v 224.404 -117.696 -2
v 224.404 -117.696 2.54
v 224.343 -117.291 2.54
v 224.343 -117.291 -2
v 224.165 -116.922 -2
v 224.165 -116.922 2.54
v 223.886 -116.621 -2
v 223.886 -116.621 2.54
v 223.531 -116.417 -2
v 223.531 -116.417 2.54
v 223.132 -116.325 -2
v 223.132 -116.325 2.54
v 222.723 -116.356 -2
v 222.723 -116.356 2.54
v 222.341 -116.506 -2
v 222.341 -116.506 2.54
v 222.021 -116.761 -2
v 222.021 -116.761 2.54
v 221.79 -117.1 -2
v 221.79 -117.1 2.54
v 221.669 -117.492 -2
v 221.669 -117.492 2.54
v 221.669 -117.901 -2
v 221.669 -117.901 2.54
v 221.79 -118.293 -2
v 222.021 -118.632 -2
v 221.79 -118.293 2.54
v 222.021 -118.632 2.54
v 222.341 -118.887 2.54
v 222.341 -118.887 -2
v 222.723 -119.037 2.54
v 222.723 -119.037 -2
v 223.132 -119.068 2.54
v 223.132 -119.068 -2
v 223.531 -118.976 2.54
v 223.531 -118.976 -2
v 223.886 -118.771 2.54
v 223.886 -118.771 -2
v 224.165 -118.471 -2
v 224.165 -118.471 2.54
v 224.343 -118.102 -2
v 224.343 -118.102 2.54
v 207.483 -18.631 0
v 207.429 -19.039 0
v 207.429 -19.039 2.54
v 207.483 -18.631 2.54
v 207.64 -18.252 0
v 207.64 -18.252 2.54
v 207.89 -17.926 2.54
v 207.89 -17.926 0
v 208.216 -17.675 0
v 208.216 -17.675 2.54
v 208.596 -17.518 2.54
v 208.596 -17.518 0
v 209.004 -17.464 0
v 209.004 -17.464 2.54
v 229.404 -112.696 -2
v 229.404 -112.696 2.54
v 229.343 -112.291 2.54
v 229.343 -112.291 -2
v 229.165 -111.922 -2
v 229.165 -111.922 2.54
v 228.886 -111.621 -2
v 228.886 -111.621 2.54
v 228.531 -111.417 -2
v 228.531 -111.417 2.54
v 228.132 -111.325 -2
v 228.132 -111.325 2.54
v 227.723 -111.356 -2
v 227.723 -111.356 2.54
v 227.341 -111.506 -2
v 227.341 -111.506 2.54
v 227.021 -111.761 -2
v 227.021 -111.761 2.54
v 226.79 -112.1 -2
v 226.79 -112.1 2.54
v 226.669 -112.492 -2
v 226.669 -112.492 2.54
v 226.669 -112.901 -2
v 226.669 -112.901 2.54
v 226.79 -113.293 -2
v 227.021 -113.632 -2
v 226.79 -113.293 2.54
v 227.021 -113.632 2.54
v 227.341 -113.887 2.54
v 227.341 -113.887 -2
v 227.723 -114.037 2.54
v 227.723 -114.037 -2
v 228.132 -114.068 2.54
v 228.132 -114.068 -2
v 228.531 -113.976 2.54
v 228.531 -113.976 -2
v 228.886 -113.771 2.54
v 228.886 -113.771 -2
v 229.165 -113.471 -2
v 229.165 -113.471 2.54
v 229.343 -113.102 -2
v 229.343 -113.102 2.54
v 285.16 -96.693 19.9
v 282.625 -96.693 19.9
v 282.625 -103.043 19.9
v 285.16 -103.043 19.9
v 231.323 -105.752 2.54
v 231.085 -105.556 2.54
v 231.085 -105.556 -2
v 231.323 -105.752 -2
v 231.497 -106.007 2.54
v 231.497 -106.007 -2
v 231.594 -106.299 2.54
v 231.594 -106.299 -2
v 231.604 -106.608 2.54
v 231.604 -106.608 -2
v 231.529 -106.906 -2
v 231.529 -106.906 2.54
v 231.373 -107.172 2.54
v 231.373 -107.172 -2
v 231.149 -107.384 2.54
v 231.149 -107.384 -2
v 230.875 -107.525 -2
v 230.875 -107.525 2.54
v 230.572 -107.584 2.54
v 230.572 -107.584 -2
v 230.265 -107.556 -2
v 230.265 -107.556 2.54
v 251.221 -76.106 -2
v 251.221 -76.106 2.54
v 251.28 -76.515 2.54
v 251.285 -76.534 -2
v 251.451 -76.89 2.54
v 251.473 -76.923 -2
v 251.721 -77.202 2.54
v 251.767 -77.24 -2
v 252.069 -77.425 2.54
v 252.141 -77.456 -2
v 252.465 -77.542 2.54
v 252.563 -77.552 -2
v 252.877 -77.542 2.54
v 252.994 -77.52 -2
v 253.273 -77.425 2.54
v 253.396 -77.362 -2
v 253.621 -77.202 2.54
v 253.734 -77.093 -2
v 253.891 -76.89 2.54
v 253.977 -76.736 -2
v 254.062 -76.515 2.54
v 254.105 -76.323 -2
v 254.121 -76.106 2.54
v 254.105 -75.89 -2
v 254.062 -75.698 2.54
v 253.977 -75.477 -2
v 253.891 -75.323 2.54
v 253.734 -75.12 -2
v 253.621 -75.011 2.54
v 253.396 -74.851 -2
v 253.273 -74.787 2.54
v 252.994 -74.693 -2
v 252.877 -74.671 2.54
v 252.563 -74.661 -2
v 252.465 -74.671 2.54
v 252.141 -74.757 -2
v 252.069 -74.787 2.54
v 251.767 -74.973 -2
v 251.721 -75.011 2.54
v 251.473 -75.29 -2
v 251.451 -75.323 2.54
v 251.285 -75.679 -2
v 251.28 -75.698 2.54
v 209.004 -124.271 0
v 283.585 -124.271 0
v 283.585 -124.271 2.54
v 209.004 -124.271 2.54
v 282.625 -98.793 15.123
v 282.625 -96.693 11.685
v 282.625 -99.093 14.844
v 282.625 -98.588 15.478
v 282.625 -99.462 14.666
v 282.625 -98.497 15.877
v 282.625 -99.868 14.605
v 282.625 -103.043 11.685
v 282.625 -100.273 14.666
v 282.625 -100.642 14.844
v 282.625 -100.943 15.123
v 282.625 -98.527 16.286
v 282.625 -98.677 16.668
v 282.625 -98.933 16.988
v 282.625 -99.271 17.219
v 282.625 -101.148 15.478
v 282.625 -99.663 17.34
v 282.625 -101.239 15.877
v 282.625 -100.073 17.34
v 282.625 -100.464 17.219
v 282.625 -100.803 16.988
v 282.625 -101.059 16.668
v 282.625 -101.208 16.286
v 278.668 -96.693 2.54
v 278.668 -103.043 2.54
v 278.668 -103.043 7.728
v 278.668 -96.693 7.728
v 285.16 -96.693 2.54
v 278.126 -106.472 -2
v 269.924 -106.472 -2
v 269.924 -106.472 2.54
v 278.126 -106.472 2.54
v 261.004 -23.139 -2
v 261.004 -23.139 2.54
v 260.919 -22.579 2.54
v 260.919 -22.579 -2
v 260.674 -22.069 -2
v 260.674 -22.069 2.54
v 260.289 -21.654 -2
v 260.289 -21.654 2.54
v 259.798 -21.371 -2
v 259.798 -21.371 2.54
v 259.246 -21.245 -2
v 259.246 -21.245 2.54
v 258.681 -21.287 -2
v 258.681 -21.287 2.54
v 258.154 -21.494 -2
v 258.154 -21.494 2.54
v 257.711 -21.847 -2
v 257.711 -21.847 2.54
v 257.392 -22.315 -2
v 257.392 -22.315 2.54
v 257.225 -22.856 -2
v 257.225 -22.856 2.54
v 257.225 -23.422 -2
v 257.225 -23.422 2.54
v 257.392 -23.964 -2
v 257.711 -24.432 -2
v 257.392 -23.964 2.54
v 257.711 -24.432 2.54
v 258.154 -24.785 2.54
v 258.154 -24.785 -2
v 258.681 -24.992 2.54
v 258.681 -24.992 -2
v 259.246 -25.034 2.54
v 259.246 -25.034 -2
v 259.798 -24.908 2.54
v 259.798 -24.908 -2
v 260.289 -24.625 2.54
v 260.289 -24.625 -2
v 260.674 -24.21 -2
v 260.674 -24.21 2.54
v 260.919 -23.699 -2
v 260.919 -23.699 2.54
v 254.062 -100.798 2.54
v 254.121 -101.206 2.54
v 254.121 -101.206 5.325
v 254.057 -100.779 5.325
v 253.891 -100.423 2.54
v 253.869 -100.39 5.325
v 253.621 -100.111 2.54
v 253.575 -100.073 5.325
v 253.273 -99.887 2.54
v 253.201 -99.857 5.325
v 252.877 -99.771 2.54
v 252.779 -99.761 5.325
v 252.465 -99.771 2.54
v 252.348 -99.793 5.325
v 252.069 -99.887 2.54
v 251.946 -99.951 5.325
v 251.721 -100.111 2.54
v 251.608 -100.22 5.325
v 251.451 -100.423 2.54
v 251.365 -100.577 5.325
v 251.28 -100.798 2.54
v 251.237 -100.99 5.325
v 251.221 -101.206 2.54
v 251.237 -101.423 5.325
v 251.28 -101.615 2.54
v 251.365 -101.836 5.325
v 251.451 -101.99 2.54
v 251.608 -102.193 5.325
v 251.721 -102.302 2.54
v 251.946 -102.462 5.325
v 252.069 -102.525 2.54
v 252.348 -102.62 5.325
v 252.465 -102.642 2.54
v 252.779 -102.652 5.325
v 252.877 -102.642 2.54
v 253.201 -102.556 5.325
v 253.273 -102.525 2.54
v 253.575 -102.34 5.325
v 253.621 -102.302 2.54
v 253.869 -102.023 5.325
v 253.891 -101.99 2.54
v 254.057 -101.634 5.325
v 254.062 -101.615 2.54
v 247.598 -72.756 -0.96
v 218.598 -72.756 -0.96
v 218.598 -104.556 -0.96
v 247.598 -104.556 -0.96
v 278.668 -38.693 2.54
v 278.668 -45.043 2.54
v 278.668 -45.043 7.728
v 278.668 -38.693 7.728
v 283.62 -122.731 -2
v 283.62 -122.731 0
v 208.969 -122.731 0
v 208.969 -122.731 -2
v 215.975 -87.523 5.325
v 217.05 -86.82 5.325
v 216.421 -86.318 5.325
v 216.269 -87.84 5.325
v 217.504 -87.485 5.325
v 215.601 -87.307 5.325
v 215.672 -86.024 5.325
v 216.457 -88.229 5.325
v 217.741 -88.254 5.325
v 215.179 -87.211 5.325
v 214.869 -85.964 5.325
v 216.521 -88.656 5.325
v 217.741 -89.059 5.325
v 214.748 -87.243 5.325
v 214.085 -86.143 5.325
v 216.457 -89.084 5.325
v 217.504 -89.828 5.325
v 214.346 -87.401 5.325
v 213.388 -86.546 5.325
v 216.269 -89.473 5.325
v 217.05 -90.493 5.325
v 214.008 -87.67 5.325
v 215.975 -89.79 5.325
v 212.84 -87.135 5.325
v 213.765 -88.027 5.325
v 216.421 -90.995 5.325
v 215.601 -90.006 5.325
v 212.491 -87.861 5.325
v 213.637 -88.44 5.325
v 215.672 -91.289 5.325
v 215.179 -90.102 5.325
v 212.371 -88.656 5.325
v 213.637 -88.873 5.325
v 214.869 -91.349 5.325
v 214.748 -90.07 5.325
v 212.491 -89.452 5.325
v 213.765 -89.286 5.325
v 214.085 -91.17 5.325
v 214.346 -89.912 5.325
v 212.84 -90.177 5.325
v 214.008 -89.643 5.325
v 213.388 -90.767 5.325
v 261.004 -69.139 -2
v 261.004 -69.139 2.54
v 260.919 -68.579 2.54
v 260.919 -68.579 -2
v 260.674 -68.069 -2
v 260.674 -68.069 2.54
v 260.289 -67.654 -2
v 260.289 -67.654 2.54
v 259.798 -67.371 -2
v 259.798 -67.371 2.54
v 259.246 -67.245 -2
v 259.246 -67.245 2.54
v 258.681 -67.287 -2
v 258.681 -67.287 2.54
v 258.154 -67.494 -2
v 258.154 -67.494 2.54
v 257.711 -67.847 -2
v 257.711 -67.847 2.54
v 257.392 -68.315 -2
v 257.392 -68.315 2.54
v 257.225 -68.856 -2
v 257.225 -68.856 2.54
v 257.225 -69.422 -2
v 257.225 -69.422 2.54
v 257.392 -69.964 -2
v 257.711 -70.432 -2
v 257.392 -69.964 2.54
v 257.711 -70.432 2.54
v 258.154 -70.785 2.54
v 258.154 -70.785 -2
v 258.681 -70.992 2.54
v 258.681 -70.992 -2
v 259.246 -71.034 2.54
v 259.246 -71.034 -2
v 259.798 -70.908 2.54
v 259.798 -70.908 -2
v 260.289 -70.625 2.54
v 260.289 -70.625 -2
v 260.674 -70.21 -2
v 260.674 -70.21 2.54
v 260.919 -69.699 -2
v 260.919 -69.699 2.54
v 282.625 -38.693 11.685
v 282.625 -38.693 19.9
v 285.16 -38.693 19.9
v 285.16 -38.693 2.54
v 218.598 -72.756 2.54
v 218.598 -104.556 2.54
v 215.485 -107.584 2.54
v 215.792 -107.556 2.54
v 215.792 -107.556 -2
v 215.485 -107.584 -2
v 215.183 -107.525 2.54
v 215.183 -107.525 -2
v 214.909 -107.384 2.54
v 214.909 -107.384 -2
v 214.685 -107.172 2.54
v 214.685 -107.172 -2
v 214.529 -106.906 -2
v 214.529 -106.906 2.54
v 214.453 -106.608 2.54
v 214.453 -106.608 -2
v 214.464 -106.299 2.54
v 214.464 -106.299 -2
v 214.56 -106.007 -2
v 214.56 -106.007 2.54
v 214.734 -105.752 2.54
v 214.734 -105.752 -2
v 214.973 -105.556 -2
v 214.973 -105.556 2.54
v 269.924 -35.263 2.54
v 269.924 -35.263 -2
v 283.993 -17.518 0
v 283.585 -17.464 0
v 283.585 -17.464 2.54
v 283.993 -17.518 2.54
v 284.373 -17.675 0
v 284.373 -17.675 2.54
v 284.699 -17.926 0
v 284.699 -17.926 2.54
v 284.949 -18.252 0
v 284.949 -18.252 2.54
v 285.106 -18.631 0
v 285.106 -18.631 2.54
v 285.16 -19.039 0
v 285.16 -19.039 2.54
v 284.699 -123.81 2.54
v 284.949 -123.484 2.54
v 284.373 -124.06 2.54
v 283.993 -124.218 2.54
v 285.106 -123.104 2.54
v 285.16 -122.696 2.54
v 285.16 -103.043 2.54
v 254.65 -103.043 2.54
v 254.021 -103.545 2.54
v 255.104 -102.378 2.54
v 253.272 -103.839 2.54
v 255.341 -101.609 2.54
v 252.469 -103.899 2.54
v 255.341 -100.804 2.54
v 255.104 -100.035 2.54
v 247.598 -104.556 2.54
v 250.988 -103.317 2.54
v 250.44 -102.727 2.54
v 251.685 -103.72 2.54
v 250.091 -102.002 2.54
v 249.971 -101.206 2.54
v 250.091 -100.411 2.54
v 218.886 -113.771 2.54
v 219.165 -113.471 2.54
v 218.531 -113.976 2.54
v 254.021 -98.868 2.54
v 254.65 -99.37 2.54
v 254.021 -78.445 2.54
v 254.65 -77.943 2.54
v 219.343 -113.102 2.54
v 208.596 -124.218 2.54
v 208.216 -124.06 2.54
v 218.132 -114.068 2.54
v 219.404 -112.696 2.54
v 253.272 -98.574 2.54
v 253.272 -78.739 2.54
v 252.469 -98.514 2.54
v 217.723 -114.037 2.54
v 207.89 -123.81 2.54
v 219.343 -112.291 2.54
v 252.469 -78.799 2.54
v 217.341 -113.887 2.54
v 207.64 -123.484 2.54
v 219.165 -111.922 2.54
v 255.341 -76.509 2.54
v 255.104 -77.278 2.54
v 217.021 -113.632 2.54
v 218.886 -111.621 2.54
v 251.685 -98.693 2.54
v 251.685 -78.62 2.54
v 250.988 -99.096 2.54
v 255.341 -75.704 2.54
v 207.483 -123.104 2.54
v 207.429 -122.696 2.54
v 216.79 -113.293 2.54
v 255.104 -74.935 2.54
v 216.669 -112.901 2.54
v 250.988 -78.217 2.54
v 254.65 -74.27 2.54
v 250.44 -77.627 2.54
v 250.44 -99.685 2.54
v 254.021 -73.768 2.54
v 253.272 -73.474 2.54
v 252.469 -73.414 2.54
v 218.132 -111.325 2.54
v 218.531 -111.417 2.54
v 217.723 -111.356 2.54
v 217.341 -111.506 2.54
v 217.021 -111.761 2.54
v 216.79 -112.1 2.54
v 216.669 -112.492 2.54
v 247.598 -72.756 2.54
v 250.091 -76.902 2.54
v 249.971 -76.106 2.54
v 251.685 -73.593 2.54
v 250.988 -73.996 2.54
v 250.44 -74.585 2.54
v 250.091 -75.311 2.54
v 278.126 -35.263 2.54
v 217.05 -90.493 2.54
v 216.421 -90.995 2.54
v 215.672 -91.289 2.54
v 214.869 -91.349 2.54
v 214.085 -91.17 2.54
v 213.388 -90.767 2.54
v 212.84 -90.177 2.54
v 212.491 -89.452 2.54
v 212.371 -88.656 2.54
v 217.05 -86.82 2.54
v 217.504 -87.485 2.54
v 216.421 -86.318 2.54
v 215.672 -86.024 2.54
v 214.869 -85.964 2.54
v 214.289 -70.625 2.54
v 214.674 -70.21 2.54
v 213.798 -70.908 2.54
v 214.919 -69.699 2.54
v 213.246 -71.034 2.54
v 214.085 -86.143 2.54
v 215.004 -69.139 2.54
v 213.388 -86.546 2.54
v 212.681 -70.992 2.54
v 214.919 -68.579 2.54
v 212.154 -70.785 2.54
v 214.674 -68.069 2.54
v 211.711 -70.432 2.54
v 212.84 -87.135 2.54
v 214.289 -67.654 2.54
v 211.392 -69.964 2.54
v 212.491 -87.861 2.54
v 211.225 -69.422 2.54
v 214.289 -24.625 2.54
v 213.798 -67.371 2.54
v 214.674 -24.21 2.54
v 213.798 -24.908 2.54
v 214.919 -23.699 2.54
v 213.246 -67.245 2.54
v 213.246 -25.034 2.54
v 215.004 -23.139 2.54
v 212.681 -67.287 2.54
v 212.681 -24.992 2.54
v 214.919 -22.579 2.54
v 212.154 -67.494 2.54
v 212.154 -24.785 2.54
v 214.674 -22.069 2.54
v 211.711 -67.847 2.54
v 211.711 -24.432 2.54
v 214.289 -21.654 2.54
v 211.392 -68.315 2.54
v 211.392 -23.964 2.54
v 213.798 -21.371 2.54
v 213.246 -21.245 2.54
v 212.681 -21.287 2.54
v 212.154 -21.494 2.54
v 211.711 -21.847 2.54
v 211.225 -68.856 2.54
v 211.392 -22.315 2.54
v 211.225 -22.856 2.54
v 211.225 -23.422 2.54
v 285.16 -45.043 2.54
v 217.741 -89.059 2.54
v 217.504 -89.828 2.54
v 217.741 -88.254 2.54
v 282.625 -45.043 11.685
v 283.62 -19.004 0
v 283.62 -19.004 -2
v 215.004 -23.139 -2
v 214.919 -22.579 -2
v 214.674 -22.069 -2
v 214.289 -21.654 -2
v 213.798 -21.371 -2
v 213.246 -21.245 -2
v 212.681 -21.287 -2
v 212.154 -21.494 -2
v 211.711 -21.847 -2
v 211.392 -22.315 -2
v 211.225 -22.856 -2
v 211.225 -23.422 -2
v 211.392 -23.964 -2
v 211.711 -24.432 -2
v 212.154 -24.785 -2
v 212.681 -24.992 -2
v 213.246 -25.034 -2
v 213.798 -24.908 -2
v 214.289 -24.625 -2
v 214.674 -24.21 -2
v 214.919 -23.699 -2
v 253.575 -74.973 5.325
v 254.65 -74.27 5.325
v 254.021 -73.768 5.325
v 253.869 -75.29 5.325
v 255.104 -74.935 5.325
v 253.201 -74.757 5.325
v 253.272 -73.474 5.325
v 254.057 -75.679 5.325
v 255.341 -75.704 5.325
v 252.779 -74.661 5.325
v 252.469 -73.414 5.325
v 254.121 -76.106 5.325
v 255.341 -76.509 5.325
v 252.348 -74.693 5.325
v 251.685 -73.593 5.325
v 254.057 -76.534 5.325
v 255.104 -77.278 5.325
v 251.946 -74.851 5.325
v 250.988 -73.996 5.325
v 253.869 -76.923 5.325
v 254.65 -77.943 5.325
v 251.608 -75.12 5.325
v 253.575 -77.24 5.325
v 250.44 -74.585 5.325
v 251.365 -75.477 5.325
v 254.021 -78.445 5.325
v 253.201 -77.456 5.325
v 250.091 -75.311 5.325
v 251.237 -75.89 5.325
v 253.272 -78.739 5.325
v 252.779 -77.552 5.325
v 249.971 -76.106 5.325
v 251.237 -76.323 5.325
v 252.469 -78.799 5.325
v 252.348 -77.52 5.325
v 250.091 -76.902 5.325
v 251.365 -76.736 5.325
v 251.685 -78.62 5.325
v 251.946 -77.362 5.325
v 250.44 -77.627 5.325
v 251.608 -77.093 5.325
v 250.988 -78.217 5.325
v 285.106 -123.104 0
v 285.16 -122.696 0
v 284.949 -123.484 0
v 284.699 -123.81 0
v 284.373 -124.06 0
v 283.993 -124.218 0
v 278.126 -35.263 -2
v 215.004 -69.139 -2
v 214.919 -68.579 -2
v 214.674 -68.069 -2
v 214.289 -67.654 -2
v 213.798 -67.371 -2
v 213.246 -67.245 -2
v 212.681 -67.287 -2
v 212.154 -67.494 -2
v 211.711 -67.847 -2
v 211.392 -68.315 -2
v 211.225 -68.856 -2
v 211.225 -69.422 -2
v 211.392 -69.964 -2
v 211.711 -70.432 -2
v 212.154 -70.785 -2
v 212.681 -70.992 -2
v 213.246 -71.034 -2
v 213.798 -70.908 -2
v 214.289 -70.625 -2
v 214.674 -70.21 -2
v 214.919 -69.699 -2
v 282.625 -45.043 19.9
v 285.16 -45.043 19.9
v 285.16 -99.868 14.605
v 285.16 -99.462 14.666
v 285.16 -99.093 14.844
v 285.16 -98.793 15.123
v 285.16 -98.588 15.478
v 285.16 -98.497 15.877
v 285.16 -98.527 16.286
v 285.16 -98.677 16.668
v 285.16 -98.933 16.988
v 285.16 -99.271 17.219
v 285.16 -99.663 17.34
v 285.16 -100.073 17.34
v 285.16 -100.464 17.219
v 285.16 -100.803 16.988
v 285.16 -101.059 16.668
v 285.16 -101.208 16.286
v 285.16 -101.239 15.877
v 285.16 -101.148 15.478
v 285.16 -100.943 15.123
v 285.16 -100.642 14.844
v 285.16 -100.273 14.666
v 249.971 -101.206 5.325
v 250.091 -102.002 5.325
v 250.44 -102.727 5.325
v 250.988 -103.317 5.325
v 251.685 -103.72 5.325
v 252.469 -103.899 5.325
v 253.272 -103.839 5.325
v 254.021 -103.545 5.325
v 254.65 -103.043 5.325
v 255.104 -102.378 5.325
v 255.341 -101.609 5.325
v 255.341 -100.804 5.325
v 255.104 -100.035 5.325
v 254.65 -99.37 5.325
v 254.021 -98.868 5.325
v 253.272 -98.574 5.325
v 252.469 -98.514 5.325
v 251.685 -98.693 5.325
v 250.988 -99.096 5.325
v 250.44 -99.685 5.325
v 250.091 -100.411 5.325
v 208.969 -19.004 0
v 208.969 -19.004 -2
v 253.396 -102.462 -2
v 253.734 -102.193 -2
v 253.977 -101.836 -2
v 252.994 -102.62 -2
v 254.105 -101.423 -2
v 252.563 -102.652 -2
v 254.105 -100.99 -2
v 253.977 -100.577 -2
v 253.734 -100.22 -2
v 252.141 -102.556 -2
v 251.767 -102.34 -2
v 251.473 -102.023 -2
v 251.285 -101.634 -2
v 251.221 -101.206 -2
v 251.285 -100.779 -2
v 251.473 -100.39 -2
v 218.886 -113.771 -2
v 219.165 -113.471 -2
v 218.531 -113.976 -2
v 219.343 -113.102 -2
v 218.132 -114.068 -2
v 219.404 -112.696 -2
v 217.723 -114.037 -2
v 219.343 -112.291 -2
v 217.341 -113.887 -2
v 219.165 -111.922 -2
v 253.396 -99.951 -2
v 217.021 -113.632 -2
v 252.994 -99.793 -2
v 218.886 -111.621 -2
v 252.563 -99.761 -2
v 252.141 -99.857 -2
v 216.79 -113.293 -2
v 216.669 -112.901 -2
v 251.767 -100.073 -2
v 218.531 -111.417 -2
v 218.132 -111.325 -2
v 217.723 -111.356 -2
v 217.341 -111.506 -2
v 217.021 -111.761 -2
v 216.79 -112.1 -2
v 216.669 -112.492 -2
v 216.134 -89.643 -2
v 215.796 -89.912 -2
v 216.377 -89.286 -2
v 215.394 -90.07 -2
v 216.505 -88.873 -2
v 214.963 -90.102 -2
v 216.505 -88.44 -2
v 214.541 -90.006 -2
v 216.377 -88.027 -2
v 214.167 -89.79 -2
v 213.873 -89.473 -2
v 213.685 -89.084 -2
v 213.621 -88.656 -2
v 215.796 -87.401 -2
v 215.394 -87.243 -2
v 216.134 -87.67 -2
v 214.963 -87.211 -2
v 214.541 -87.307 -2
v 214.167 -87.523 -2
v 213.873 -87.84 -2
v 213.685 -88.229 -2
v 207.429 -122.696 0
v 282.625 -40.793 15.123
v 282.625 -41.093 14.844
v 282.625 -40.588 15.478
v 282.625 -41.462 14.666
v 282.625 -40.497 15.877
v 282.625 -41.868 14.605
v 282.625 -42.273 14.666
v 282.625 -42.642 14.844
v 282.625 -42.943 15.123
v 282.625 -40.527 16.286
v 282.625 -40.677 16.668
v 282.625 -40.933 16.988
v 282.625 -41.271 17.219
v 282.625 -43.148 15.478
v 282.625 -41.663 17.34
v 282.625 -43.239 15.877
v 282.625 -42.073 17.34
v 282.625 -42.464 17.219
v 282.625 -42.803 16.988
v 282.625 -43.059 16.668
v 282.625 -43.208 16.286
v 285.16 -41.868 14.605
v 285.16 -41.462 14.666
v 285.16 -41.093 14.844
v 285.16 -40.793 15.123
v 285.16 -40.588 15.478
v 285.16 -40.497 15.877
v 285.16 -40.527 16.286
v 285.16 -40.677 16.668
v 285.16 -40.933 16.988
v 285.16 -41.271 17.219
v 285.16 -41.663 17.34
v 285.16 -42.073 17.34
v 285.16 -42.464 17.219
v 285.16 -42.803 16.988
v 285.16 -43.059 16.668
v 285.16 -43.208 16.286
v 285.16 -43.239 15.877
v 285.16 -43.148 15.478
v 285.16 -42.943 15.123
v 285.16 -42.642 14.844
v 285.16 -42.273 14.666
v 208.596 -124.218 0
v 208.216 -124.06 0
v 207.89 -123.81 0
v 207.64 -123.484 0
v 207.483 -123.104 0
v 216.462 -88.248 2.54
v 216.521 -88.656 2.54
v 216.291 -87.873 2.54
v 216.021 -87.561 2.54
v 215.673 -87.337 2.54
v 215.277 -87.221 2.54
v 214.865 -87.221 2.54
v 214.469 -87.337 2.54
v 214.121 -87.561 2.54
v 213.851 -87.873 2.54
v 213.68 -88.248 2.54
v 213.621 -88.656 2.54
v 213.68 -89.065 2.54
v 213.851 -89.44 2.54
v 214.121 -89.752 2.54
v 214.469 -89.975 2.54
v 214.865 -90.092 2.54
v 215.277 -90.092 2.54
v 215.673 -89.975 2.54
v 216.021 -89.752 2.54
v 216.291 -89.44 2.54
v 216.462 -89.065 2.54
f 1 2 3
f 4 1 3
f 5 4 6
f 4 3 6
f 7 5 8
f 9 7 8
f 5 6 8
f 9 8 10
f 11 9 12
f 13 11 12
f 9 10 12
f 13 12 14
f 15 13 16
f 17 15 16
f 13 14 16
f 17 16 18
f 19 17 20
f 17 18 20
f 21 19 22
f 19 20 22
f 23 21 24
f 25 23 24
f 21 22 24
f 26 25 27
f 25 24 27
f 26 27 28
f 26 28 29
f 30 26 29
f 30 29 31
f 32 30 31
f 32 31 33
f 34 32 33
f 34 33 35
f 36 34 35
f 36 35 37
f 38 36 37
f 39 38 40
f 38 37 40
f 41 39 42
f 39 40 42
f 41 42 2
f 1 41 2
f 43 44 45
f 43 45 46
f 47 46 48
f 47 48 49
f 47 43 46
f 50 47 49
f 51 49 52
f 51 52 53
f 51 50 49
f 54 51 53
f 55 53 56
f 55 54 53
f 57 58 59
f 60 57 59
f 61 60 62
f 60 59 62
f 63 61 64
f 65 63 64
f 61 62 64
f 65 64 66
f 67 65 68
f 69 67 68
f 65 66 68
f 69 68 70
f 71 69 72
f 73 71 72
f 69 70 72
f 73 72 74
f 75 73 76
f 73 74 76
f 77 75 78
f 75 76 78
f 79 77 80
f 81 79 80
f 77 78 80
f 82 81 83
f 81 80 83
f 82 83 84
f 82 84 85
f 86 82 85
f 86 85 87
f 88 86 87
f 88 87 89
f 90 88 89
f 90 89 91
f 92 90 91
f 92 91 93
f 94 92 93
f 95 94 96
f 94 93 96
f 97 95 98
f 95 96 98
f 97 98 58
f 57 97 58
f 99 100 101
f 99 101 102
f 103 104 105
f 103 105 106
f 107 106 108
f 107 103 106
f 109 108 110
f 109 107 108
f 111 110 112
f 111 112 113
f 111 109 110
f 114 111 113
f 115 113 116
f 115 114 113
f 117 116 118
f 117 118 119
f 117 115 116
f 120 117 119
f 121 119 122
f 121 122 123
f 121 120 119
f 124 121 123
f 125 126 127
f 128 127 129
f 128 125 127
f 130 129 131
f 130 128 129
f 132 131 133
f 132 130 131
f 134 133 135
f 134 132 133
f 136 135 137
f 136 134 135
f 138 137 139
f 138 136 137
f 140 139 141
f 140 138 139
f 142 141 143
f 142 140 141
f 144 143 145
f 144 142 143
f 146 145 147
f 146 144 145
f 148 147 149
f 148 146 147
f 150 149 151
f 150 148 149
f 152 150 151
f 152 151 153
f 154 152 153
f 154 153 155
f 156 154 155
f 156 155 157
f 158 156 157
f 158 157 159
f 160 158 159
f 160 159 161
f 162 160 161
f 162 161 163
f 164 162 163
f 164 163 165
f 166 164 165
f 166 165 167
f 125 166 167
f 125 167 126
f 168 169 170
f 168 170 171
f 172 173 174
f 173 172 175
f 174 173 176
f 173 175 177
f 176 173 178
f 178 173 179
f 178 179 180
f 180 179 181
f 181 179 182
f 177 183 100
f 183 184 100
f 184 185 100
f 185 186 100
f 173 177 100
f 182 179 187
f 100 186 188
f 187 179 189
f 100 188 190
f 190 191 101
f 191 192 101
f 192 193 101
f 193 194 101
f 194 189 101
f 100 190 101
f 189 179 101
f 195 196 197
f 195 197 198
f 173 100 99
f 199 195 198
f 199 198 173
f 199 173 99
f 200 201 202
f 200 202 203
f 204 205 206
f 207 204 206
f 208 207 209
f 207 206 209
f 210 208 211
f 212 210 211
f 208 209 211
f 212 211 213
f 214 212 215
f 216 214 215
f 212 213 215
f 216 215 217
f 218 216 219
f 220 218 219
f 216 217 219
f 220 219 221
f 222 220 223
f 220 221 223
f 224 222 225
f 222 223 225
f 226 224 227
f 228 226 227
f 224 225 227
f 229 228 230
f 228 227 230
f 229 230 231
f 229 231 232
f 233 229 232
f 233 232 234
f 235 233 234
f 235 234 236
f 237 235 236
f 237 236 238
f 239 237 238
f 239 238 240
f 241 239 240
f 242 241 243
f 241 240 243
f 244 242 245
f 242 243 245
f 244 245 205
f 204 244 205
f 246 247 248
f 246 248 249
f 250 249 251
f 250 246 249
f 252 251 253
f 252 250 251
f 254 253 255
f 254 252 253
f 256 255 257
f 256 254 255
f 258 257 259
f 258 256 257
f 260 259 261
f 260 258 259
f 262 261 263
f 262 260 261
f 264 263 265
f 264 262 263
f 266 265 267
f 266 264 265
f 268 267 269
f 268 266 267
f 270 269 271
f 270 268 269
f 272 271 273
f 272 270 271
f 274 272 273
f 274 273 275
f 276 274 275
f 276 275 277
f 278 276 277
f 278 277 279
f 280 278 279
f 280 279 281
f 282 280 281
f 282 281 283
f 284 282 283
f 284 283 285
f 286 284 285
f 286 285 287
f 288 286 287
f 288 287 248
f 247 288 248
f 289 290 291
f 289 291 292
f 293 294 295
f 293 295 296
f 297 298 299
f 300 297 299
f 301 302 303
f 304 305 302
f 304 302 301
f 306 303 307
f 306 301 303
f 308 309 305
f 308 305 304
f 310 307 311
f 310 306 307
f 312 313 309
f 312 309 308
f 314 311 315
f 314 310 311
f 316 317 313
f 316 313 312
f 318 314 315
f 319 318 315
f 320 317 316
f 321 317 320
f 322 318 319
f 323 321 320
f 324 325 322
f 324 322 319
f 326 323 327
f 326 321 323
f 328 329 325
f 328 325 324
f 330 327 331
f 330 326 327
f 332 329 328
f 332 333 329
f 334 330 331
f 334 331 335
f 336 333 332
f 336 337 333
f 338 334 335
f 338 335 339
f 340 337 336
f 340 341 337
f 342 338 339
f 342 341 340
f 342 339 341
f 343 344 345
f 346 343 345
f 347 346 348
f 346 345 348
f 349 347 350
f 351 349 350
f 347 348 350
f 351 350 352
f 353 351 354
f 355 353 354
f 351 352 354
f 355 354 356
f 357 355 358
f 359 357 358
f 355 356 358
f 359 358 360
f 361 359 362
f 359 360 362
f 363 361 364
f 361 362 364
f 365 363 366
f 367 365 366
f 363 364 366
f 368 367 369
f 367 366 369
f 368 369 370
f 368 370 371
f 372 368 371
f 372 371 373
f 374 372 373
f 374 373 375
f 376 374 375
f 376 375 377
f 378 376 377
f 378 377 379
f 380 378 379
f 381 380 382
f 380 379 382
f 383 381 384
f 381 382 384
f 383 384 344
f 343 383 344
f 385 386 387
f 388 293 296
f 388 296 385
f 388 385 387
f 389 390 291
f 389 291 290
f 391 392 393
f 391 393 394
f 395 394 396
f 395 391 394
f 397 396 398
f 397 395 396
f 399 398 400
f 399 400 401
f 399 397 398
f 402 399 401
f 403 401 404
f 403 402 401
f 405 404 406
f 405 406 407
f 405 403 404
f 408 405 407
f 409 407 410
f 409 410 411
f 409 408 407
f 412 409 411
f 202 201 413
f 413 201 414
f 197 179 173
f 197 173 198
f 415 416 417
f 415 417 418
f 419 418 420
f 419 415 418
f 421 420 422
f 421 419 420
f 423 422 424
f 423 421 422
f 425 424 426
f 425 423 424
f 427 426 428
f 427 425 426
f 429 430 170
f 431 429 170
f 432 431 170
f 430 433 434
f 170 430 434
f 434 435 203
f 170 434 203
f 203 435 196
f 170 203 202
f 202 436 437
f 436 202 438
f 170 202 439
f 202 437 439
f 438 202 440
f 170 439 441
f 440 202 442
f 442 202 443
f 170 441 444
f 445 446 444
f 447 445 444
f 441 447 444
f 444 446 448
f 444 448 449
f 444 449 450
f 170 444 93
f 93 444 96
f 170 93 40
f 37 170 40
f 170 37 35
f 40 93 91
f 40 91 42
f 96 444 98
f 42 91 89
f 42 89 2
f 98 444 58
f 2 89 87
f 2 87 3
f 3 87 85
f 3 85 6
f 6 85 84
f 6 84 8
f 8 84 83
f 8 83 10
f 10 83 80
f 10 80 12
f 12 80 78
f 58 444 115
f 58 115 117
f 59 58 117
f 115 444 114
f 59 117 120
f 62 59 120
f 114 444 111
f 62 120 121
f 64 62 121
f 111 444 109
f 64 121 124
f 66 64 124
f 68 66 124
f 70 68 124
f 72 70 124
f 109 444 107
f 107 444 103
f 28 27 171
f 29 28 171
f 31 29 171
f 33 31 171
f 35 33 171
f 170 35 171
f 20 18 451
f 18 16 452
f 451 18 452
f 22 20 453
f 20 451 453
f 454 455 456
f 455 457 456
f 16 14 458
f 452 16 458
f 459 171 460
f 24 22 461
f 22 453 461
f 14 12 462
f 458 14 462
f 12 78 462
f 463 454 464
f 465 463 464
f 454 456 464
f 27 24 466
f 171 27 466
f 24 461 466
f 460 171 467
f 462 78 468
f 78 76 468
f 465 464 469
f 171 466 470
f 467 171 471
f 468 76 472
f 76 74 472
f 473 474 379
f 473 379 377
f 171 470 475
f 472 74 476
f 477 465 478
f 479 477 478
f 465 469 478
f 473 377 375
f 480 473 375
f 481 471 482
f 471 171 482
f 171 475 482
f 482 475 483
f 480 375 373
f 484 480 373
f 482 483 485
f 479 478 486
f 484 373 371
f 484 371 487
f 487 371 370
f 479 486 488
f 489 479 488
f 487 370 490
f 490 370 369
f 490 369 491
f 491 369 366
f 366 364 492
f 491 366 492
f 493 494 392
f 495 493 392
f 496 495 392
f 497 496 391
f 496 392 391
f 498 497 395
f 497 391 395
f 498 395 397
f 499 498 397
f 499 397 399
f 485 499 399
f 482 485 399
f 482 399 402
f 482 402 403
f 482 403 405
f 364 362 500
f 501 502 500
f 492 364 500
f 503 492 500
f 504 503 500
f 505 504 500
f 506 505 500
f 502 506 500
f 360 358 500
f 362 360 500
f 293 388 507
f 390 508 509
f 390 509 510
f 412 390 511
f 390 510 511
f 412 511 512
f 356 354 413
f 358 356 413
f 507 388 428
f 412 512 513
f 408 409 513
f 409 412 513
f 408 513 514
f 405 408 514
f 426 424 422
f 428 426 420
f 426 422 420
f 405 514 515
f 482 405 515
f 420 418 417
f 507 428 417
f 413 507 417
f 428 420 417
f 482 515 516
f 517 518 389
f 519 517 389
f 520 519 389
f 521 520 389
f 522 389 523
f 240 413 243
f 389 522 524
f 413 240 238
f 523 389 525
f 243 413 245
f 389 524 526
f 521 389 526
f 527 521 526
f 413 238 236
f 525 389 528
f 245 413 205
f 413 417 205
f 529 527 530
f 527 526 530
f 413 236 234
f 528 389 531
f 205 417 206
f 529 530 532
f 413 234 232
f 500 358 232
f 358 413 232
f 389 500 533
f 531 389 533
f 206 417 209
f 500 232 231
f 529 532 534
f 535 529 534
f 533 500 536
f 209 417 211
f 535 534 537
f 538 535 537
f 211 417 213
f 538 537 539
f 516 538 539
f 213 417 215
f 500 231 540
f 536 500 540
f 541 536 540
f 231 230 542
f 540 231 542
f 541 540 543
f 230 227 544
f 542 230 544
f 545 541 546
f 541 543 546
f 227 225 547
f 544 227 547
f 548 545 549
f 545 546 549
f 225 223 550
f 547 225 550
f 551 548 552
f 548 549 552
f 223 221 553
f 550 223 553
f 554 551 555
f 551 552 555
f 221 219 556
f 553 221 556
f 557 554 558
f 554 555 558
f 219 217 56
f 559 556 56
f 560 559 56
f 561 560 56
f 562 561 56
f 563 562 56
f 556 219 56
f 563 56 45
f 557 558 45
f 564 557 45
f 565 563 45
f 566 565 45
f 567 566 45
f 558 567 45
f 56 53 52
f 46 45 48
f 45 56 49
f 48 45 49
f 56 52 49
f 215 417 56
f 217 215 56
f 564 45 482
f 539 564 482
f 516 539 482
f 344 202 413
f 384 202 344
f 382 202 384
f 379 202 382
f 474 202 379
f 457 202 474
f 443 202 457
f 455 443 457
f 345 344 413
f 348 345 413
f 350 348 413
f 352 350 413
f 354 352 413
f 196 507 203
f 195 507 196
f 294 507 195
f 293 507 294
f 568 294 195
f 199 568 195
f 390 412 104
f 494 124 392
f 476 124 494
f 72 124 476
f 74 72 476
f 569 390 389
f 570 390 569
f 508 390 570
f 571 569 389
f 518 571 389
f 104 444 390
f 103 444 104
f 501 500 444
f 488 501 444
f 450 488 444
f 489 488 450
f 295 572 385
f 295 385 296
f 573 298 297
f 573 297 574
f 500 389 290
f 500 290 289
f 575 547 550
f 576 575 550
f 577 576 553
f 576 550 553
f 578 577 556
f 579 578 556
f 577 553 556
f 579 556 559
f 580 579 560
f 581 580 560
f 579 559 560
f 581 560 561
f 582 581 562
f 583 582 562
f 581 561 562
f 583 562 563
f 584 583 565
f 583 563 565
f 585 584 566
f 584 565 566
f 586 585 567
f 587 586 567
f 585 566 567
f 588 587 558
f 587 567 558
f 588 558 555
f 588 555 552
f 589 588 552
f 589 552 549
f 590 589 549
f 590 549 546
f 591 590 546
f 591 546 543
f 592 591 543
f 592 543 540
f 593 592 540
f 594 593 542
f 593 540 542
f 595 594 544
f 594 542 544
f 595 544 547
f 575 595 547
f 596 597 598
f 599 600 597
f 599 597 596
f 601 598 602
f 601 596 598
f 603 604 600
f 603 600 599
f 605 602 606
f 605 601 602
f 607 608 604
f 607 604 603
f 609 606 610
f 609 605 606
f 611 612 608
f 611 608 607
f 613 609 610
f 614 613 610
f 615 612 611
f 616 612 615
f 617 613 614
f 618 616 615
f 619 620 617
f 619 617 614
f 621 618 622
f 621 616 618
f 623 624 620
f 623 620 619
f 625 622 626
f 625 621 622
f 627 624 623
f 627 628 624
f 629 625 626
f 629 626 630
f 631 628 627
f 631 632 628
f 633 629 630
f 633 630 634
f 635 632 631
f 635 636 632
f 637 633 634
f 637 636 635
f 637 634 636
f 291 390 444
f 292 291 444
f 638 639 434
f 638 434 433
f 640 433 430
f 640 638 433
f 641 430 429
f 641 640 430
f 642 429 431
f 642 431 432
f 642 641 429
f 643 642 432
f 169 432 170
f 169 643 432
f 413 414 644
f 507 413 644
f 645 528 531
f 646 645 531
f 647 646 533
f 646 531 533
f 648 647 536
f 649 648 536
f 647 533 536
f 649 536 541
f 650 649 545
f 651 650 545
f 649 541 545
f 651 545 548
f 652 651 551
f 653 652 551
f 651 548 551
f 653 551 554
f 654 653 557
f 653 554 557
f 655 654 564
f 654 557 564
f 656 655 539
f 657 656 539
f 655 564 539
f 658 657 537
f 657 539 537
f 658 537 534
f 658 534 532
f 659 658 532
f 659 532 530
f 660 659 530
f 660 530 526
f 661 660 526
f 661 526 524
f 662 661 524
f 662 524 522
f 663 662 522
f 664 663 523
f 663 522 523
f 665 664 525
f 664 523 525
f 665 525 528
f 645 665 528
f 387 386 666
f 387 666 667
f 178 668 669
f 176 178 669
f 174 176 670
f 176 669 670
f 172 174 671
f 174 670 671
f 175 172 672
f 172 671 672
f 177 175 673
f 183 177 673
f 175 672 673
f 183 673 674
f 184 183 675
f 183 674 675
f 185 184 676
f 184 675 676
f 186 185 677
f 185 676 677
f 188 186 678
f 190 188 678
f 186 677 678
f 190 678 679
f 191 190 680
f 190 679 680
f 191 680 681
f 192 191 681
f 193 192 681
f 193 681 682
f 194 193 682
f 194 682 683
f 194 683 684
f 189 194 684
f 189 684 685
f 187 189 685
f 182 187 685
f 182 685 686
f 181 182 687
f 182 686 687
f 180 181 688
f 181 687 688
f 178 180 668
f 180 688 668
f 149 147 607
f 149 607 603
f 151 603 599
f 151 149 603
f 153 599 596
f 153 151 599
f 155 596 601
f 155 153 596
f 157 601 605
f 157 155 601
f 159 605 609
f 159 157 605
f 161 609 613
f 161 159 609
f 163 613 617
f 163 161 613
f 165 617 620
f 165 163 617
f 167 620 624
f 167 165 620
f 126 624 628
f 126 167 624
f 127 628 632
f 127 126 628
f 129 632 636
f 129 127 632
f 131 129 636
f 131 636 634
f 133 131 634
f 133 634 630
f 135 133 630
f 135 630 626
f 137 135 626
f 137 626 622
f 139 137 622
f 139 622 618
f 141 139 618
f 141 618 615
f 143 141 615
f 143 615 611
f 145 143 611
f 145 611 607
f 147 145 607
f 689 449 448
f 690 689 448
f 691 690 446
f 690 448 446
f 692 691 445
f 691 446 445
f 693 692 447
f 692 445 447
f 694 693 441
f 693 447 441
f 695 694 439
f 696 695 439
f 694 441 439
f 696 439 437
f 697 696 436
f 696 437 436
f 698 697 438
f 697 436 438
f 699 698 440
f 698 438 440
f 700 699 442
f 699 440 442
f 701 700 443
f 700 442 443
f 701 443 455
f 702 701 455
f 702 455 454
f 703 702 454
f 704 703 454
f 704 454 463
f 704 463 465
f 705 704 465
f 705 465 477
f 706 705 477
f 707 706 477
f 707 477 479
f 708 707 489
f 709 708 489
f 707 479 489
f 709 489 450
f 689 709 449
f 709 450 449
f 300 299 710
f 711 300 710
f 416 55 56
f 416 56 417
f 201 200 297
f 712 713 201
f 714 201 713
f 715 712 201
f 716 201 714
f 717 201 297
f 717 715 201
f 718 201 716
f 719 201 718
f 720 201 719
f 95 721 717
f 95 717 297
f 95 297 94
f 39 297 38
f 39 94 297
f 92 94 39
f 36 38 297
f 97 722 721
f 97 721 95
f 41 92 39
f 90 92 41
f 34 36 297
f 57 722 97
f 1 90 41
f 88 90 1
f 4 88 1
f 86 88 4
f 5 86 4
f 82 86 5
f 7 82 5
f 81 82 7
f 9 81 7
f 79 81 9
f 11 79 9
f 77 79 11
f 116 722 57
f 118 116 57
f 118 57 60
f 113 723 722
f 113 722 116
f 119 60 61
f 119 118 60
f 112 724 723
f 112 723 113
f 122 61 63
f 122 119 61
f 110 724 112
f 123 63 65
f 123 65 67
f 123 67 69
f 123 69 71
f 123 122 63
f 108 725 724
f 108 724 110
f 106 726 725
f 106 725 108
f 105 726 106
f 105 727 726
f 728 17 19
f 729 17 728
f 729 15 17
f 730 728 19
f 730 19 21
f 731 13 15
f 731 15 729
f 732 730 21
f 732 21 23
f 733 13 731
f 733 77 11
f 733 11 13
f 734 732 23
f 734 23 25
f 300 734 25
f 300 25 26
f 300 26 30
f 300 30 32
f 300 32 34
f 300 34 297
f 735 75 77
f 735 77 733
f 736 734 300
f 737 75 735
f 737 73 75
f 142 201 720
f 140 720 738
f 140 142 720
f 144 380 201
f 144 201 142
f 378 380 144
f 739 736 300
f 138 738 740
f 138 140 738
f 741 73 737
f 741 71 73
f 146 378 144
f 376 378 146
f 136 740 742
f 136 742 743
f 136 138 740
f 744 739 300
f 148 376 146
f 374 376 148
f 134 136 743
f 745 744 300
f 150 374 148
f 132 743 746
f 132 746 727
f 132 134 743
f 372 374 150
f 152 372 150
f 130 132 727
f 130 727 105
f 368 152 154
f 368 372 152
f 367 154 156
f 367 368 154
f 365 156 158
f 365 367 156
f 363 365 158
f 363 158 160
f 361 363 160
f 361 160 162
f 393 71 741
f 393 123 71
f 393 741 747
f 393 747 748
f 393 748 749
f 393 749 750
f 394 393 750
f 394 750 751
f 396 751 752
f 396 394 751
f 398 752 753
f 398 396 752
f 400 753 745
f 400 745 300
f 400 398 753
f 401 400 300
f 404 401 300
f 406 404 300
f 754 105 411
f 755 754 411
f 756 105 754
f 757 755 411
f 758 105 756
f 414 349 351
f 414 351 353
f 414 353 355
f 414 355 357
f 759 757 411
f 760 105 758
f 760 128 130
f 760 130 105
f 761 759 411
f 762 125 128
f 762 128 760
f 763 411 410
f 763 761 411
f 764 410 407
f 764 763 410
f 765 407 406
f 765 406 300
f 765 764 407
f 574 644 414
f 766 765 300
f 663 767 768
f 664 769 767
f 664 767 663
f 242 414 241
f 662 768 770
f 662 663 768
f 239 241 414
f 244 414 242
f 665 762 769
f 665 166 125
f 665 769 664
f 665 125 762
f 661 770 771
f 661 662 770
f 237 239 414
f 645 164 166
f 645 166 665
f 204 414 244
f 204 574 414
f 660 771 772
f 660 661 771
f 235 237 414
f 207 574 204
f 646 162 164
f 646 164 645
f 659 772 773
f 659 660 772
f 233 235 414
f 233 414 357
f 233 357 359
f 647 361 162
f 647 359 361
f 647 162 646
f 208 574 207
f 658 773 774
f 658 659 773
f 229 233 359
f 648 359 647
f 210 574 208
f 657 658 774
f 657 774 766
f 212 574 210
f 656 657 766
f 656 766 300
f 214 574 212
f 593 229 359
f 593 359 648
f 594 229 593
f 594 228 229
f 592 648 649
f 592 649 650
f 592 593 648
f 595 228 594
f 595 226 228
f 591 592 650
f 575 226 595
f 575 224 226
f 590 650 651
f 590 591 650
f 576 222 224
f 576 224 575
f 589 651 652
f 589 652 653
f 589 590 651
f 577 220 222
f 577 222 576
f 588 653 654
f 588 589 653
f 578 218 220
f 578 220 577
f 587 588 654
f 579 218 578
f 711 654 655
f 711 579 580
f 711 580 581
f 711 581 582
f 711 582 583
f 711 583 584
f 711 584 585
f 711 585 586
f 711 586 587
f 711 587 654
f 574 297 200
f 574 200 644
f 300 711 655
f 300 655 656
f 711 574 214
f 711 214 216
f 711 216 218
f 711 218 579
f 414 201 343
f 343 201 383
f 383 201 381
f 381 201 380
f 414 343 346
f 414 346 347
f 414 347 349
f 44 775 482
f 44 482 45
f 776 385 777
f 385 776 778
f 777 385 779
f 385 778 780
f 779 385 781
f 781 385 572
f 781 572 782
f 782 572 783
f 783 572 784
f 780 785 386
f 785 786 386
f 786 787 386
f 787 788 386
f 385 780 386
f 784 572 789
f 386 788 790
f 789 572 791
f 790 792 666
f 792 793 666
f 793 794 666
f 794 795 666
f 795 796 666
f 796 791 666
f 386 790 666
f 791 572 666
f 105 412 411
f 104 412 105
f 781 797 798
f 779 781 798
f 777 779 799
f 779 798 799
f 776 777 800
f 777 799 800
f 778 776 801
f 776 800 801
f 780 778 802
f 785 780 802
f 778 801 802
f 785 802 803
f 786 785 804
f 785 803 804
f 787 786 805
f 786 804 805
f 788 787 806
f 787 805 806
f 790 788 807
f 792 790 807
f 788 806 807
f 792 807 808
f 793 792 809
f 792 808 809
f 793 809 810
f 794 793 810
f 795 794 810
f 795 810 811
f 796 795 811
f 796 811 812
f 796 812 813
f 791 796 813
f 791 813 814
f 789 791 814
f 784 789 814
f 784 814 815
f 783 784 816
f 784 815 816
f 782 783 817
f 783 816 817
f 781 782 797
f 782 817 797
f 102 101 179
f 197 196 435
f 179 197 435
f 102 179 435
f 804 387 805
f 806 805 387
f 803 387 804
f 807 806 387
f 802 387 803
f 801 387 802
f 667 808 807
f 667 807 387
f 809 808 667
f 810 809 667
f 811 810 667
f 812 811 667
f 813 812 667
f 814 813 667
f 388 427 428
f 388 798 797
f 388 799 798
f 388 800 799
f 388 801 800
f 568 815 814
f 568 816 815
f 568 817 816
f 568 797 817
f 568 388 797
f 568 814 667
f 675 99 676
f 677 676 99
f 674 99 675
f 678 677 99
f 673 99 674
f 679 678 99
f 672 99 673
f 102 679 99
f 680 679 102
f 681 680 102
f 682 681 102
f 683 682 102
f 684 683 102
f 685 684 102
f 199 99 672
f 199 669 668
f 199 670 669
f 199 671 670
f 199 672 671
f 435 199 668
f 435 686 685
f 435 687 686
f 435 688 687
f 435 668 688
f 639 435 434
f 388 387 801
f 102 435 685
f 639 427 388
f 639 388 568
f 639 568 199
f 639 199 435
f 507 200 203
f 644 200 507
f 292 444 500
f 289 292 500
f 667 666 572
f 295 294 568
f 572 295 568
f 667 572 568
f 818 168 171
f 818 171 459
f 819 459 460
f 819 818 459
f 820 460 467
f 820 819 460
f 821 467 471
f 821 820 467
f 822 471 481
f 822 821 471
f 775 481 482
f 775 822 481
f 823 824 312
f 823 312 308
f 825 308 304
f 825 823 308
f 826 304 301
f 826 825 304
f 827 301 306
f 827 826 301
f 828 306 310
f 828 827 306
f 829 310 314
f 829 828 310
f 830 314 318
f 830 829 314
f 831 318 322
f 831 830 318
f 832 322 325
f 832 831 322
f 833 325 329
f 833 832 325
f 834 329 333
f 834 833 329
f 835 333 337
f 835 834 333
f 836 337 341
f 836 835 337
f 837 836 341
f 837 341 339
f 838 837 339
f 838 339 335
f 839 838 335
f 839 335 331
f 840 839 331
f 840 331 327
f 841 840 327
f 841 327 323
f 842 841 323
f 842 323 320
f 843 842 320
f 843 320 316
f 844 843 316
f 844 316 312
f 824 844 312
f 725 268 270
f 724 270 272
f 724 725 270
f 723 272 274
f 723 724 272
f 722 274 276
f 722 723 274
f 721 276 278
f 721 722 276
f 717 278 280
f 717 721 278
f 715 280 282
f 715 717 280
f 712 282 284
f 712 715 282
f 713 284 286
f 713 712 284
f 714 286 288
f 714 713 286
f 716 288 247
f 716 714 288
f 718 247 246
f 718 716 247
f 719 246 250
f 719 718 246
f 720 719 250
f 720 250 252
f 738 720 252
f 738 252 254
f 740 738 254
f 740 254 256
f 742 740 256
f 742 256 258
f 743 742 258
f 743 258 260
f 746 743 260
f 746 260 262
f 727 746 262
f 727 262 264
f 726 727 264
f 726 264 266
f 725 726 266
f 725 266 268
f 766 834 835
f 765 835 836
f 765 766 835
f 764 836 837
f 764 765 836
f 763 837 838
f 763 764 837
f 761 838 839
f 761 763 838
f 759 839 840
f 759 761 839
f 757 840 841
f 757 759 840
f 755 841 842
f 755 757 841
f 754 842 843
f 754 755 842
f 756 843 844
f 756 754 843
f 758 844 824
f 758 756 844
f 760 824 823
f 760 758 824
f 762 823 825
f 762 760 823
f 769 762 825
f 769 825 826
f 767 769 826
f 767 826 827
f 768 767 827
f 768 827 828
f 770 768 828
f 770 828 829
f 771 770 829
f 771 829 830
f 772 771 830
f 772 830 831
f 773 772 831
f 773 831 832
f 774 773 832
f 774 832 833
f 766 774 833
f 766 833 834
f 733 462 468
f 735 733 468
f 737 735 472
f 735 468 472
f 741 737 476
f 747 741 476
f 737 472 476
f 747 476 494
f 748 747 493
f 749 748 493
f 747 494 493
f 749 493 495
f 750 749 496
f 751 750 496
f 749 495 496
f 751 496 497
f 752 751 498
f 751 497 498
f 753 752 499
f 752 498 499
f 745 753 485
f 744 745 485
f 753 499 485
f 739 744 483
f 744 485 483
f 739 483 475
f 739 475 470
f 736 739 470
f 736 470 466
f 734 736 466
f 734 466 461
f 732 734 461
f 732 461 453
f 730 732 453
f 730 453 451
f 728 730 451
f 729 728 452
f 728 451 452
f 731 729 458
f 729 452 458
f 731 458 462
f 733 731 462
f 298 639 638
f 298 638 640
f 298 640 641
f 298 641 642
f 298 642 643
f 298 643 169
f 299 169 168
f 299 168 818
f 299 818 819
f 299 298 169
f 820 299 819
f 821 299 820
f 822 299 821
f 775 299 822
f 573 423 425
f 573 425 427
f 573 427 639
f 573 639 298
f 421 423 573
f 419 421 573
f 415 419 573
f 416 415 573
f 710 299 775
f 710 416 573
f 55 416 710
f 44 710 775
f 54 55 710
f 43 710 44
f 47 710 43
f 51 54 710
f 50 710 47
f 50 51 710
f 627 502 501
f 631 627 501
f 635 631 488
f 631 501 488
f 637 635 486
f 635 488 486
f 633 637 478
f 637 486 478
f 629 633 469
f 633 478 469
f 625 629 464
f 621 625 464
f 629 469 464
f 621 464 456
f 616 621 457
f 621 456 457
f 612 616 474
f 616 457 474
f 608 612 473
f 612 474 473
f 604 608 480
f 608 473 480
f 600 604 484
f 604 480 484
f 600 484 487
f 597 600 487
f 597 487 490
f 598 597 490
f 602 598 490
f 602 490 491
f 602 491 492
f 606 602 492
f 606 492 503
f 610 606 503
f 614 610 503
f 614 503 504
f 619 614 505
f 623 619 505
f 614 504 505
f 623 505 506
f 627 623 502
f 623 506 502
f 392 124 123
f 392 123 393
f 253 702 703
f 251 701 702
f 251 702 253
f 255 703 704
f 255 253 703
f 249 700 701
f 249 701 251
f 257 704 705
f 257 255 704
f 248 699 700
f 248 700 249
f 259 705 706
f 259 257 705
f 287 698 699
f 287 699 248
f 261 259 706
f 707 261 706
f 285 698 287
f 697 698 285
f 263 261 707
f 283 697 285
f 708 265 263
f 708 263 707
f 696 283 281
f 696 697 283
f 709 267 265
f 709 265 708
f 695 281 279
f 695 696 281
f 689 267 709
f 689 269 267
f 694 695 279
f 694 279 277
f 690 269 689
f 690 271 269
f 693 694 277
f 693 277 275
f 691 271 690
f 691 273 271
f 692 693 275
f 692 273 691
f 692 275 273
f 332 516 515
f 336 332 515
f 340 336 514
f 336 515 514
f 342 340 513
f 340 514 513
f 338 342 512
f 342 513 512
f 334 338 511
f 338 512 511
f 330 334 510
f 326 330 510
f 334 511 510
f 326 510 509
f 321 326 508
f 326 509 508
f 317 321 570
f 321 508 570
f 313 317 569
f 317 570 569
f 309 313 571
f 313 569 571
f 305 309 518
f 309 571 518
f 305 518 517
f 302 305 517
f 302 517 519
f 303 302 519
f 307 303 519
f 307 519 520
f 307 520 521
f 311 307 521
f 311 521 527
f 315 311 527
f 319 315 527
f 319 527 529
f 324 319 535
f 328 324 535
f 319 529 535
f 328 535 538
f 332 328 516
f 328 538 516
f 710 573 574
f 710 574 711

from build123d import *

# Parameters (mm, degrees)
BOSS_EXTRUDE1_DEPTH      = 2.54
SKETCH2_W                = 74.651204731
SKETCH2_H                = 103.727
BOSS_EXTRUDE2_DEPTH      = 2
CAMERA_RIBBON_HOLE_DEPTH = 4.54
SKETCH4_W                = 29
SKETCH4_H                = 31.8
RFD900_HOLE_DEPTH        = 3.5
SKETCH5_R                = 2.7
SKETCH5_R_2              = 1.45
RFD900_MOUNT_DEPTH       = 2.784999988
WIRE_START               = -2
SKETCH6_W                = 8.202097681
SKETCH6_H                = 71.209120783
WIRE_HOLE_DEPTH          = 4.54
SKETCH7_W                = 6.492515401
SKETCH7_H                = 6.35
BOSS_EXTRUDE4_DEPTH      = 17.36
CUT_EXTRUDE4_REACH       = 300.389
SKETCH13_R               = 1.375000001
CUT_EXTRUDE7_DEPTH       = 2.535264343
CUT_EXTRUDE6_START       = -4.54
SKETCH12_R               = 1.45
CUT_EXTRUDE6_DEPTH       = 4.54
SKETCH15_R               = 1.9
CUT_EXTRUDE8_DEPTH       = 4.54
SKETCH16_R               = 1.375
CUT_EXTRUDE9_DEPTH       = 4.54


with BuildPart() as part:
    # Sketch1 → Boss-Extrude1 (new body)
    with BuildSketch(Plane.XY):
        with BuildLine():
            Line((209.003679248, -17.464278872), (283.585283979, -17.464278872))
            ThreePointArc((283.585283979, -17.464278872), (284.698835738, -17.925527113), (285.160083979, -19.039078872))
            Line((285.160083979, -19.039078872), (285.160083979, -122.696478872))
            ThreePointArc((285.160083979, -122.696478872), (284.698835738, -123.810030631), (283.585283979, -124.271278872))
            Line((283.585283979, -124.271278872), (209.003679248, -124.271278872))
            ThreePointArc((209.003679248, -124.271278872), (207.890127489, -123.810030631), (207.428879248, -122.696478872))
            Line((207.428879248, -122.696478872), (207.428879248, -19.039078872))
            ThreePointArc((207.428879248, -19.039078872), (207.890127489, -17.925527113), (209.003679248, -17.464278872))
        make_face()
    extrude(amount=BOSS_EXTRUDE1_DEPTH)

    # Sketch2 → Boss-Extrude2 (add)
    with BuildSketch(Plane(origin=(0, 0, 0), x_dir=(-1, 0, 0), z_dir=(0, 0, -1))):
        with Locations((-246.294481614, -70.867778872)):
            Rectangle(SKETCH2_W, SKETCH2_H)
    extrude(amount=BOSS_EXTRUDE2_DEPTH)

    # Sketch3 → Camera Ribbon Hole (cut)
    with BuildSketch(Plane.XY.offset(2.54)):
        with BuildLine():
            Line((214.972517673, -105.55645249), (231.085240907, -105.55645249))
            ThreePointArc((231.085240907, -105.55645249), (231.52887929, -106.906363326), (230.265368958, -107.55645249))
            Line((230.265368958, -107.55645249), (215.792389622, -107.55645249))
            ThreePointArc((215.792389622, -107.55645249), (214.52887929, -106.906363326), (214.972517673, -105.55645249))
        make_face()
    extrude(amount=-CAMERA_RIBBON_HOLE_DEPTH, mode=Mode.SUBTRACT)

    # Sketch4 → RFD900 Hole (cut)
    with BuildSketch(Plane.XY.offset(2.54)):
        with Locations((233.09754244, -88.65645249)):
            Rectangle(SKETCH4_W, SKETCH4_H)
    extrude(amount=-RFD900_HOLE_DEPTH, mode=Mode.SUBTRACT)

    # Sketch5 → RFD900 Mount (add)
    # profile 1 of 3: a face of its own
    with BuildSketch(Plane.XY.offset(2.54)):
        with Locations(Location((215.071008708, -88.65645249, 0), (0, 0, 180))):
            Circle(SKETCH5_R)
        with Locations((215.071008708, -88.65645249)):
            Circle(SKETCH5_R_2, mode=Mode.SUBTRACT)
    # profile 2 of 3: a face of its own
    with BuildSketch(Plane.XY.offset(2.54)):
        with Locations(Location((252.671008708, -101.20645249, 0), (0, 0, 180))):
            Circle(SKETCH5_R)
        with Locations((252.671008708, -101.20645249)):
            Circle(SKETCH5_R_2, mode=Mode.SUBTRACT)
    # profile 3 of 3: a face of its own
    with BuildSketch(Plane.XY.offset(2.54)):
        with Locations(Location((252.671008708, -76.10645249, 0), (0, 0, 180))):
            Circle(SKETCH5_R)
        with Locations((252.671008708, -76.10645249)):
            Circle(SKETCH5_R_2, mode=Mode.SUBTRACT)
    extrude(amount=RFD900_MOUNT_DEPTH)

    # Sketch6 → Wire Hole (cut)
    with BuildSketch(Plane.XY.offset(WIRE_START)):
        with Locations((274.024654874, -70.867778873)):
            Rectangle(SKETCH6_W, SKETCH6_H)
    extrude(amount=WIRE_HOLE_DEPTH, mode=Mode.SUBTRACT)

    # Sketch7 → Boss-Extrude4 (add)
    with BuildSketch(Plane.XY.offset(2.54)):
        with Locations((281.913826279, -41.867778872)):
            Rectangle(SKETCH7_W, SKETCH7_H)
        with Locations((281.913826279, -99.867778872)):
            Rectangle(SKETCH7_W, SKETCH7_H)
    extrude(amount=BOSS_EXTRUDE4_DEPTH)

    # Cut-Extrude4: up to this face of the body (flat: up to its plane)
    cut_extrude4_end = Plane(part.part.faces().sort_by_distance((281.913826279, -38.692778872, 11.22))[0])
    # Sketch8 → Cut-Extrude4 (cut, up to the picked face)
    with BuildSketch(Plane.XZ.offset(103.042778872), mode=Mode.PRIVATE) as cut_extrude4_sk1:
        Polygon((282.624819635, 11.684999999), (278.667568578, 7.727748942), (278.667568578, 19.9), (282.624819635, 19.9), (282.624819635, 16.98), (282.624819635, 14.604999999), align=None)
    cut_extrude4_tool1 = split(extrude(cut_extrude4_sk1.sketch, amount=-CUT_EXTRUDE4_REACH, mode=Mode.PRIVATE), bisect_by=cut_extrude4_end, keep=Keep.BOTH, mode=Mode.PRIVATE)
    add(cut_extrude4_tool1.solids().sort_by(Axis((280.518174, -103.042779, 14.739177), (0, 1, 0)))[0], mode=Mode.SUBTRACT)

    # Sketch13 → Cut-Extrude7 (cut)
    with BuildSketch(Plane(origin=(285.160083979, 0, 0), x_dir=(0, 0, -1), z_dir=(1, 0, 0))):
        with Locations((-15.98, -99.867778872)):
            Circle(SKETCH13_R)
        with Locations((-15.98, -41.867778872)):
            Circle(SKETCH13_R)
    extrude(amount=-CUT_EXTRUDE7_DEPTH, mode=Mode.SUBTRACT)

    # Sketch12 → Cut-Extrude6 (cut)
    with BuildSketch(Plane.XY.offset(2.54).offset(CUT_EXTRUDE6_START)):
        with Locations(Location((252.671008708, -76.10645249, 0), (0, 0, 180))):
            Circle(SKETCH12_R)
        with Locations(Location((252.671008708, -101.20645249, 0), (0, 0, 180))):
            Circle(SKETCH12_R)
        with Locations(Location((215.071008708, -88.65645249, 0), (0, 0, 180))):
            Circle(SKETCH12_R)
    extrude(amount=CUT_EXTRUDE6_DEPTH, mode=Mode.SUBTRACT)

    # Sketch15 → Cut-Extrude8 (cut)
    with BuildSketch(Plane.XY.offset(2.54)):
        with Locations((213.103879248, -23.139278872)):
            Circle(SKETCH15_R)
        with Locations((259.103879248, -23.139278872)):
            Circle(SKETCH15_R)
        with Locations((213.103879248, -69.139278872)):
            Circle(SKETCH15_R)
        with Locations((259.103879248, -69.139278872)):
            Circle(SKETCH15_R)
    extrude(amount=-CUT_EXTRUDE8_DEPTH, mode=Mode.SUBTRACT)

    # Sketch16 → Cut-Extrude9 (cut)
    with BuildSketch(Plane.XY.offset(2.54)):
        with Locations((228.028879248, -112.696478872)):
            Circle(SKETCH16_R)
        with Locations((223.028879248, -117.696478872)):
            Circle(SKETCH16_R)
        with Locations((218.028879248, -112.696478872)):
            Circle(SKETCH16_R)
    extrude(amount=-CUT_EXTRUDE9_DEPTH, mode=Mode.SUBTRACT)


solid = part.part
